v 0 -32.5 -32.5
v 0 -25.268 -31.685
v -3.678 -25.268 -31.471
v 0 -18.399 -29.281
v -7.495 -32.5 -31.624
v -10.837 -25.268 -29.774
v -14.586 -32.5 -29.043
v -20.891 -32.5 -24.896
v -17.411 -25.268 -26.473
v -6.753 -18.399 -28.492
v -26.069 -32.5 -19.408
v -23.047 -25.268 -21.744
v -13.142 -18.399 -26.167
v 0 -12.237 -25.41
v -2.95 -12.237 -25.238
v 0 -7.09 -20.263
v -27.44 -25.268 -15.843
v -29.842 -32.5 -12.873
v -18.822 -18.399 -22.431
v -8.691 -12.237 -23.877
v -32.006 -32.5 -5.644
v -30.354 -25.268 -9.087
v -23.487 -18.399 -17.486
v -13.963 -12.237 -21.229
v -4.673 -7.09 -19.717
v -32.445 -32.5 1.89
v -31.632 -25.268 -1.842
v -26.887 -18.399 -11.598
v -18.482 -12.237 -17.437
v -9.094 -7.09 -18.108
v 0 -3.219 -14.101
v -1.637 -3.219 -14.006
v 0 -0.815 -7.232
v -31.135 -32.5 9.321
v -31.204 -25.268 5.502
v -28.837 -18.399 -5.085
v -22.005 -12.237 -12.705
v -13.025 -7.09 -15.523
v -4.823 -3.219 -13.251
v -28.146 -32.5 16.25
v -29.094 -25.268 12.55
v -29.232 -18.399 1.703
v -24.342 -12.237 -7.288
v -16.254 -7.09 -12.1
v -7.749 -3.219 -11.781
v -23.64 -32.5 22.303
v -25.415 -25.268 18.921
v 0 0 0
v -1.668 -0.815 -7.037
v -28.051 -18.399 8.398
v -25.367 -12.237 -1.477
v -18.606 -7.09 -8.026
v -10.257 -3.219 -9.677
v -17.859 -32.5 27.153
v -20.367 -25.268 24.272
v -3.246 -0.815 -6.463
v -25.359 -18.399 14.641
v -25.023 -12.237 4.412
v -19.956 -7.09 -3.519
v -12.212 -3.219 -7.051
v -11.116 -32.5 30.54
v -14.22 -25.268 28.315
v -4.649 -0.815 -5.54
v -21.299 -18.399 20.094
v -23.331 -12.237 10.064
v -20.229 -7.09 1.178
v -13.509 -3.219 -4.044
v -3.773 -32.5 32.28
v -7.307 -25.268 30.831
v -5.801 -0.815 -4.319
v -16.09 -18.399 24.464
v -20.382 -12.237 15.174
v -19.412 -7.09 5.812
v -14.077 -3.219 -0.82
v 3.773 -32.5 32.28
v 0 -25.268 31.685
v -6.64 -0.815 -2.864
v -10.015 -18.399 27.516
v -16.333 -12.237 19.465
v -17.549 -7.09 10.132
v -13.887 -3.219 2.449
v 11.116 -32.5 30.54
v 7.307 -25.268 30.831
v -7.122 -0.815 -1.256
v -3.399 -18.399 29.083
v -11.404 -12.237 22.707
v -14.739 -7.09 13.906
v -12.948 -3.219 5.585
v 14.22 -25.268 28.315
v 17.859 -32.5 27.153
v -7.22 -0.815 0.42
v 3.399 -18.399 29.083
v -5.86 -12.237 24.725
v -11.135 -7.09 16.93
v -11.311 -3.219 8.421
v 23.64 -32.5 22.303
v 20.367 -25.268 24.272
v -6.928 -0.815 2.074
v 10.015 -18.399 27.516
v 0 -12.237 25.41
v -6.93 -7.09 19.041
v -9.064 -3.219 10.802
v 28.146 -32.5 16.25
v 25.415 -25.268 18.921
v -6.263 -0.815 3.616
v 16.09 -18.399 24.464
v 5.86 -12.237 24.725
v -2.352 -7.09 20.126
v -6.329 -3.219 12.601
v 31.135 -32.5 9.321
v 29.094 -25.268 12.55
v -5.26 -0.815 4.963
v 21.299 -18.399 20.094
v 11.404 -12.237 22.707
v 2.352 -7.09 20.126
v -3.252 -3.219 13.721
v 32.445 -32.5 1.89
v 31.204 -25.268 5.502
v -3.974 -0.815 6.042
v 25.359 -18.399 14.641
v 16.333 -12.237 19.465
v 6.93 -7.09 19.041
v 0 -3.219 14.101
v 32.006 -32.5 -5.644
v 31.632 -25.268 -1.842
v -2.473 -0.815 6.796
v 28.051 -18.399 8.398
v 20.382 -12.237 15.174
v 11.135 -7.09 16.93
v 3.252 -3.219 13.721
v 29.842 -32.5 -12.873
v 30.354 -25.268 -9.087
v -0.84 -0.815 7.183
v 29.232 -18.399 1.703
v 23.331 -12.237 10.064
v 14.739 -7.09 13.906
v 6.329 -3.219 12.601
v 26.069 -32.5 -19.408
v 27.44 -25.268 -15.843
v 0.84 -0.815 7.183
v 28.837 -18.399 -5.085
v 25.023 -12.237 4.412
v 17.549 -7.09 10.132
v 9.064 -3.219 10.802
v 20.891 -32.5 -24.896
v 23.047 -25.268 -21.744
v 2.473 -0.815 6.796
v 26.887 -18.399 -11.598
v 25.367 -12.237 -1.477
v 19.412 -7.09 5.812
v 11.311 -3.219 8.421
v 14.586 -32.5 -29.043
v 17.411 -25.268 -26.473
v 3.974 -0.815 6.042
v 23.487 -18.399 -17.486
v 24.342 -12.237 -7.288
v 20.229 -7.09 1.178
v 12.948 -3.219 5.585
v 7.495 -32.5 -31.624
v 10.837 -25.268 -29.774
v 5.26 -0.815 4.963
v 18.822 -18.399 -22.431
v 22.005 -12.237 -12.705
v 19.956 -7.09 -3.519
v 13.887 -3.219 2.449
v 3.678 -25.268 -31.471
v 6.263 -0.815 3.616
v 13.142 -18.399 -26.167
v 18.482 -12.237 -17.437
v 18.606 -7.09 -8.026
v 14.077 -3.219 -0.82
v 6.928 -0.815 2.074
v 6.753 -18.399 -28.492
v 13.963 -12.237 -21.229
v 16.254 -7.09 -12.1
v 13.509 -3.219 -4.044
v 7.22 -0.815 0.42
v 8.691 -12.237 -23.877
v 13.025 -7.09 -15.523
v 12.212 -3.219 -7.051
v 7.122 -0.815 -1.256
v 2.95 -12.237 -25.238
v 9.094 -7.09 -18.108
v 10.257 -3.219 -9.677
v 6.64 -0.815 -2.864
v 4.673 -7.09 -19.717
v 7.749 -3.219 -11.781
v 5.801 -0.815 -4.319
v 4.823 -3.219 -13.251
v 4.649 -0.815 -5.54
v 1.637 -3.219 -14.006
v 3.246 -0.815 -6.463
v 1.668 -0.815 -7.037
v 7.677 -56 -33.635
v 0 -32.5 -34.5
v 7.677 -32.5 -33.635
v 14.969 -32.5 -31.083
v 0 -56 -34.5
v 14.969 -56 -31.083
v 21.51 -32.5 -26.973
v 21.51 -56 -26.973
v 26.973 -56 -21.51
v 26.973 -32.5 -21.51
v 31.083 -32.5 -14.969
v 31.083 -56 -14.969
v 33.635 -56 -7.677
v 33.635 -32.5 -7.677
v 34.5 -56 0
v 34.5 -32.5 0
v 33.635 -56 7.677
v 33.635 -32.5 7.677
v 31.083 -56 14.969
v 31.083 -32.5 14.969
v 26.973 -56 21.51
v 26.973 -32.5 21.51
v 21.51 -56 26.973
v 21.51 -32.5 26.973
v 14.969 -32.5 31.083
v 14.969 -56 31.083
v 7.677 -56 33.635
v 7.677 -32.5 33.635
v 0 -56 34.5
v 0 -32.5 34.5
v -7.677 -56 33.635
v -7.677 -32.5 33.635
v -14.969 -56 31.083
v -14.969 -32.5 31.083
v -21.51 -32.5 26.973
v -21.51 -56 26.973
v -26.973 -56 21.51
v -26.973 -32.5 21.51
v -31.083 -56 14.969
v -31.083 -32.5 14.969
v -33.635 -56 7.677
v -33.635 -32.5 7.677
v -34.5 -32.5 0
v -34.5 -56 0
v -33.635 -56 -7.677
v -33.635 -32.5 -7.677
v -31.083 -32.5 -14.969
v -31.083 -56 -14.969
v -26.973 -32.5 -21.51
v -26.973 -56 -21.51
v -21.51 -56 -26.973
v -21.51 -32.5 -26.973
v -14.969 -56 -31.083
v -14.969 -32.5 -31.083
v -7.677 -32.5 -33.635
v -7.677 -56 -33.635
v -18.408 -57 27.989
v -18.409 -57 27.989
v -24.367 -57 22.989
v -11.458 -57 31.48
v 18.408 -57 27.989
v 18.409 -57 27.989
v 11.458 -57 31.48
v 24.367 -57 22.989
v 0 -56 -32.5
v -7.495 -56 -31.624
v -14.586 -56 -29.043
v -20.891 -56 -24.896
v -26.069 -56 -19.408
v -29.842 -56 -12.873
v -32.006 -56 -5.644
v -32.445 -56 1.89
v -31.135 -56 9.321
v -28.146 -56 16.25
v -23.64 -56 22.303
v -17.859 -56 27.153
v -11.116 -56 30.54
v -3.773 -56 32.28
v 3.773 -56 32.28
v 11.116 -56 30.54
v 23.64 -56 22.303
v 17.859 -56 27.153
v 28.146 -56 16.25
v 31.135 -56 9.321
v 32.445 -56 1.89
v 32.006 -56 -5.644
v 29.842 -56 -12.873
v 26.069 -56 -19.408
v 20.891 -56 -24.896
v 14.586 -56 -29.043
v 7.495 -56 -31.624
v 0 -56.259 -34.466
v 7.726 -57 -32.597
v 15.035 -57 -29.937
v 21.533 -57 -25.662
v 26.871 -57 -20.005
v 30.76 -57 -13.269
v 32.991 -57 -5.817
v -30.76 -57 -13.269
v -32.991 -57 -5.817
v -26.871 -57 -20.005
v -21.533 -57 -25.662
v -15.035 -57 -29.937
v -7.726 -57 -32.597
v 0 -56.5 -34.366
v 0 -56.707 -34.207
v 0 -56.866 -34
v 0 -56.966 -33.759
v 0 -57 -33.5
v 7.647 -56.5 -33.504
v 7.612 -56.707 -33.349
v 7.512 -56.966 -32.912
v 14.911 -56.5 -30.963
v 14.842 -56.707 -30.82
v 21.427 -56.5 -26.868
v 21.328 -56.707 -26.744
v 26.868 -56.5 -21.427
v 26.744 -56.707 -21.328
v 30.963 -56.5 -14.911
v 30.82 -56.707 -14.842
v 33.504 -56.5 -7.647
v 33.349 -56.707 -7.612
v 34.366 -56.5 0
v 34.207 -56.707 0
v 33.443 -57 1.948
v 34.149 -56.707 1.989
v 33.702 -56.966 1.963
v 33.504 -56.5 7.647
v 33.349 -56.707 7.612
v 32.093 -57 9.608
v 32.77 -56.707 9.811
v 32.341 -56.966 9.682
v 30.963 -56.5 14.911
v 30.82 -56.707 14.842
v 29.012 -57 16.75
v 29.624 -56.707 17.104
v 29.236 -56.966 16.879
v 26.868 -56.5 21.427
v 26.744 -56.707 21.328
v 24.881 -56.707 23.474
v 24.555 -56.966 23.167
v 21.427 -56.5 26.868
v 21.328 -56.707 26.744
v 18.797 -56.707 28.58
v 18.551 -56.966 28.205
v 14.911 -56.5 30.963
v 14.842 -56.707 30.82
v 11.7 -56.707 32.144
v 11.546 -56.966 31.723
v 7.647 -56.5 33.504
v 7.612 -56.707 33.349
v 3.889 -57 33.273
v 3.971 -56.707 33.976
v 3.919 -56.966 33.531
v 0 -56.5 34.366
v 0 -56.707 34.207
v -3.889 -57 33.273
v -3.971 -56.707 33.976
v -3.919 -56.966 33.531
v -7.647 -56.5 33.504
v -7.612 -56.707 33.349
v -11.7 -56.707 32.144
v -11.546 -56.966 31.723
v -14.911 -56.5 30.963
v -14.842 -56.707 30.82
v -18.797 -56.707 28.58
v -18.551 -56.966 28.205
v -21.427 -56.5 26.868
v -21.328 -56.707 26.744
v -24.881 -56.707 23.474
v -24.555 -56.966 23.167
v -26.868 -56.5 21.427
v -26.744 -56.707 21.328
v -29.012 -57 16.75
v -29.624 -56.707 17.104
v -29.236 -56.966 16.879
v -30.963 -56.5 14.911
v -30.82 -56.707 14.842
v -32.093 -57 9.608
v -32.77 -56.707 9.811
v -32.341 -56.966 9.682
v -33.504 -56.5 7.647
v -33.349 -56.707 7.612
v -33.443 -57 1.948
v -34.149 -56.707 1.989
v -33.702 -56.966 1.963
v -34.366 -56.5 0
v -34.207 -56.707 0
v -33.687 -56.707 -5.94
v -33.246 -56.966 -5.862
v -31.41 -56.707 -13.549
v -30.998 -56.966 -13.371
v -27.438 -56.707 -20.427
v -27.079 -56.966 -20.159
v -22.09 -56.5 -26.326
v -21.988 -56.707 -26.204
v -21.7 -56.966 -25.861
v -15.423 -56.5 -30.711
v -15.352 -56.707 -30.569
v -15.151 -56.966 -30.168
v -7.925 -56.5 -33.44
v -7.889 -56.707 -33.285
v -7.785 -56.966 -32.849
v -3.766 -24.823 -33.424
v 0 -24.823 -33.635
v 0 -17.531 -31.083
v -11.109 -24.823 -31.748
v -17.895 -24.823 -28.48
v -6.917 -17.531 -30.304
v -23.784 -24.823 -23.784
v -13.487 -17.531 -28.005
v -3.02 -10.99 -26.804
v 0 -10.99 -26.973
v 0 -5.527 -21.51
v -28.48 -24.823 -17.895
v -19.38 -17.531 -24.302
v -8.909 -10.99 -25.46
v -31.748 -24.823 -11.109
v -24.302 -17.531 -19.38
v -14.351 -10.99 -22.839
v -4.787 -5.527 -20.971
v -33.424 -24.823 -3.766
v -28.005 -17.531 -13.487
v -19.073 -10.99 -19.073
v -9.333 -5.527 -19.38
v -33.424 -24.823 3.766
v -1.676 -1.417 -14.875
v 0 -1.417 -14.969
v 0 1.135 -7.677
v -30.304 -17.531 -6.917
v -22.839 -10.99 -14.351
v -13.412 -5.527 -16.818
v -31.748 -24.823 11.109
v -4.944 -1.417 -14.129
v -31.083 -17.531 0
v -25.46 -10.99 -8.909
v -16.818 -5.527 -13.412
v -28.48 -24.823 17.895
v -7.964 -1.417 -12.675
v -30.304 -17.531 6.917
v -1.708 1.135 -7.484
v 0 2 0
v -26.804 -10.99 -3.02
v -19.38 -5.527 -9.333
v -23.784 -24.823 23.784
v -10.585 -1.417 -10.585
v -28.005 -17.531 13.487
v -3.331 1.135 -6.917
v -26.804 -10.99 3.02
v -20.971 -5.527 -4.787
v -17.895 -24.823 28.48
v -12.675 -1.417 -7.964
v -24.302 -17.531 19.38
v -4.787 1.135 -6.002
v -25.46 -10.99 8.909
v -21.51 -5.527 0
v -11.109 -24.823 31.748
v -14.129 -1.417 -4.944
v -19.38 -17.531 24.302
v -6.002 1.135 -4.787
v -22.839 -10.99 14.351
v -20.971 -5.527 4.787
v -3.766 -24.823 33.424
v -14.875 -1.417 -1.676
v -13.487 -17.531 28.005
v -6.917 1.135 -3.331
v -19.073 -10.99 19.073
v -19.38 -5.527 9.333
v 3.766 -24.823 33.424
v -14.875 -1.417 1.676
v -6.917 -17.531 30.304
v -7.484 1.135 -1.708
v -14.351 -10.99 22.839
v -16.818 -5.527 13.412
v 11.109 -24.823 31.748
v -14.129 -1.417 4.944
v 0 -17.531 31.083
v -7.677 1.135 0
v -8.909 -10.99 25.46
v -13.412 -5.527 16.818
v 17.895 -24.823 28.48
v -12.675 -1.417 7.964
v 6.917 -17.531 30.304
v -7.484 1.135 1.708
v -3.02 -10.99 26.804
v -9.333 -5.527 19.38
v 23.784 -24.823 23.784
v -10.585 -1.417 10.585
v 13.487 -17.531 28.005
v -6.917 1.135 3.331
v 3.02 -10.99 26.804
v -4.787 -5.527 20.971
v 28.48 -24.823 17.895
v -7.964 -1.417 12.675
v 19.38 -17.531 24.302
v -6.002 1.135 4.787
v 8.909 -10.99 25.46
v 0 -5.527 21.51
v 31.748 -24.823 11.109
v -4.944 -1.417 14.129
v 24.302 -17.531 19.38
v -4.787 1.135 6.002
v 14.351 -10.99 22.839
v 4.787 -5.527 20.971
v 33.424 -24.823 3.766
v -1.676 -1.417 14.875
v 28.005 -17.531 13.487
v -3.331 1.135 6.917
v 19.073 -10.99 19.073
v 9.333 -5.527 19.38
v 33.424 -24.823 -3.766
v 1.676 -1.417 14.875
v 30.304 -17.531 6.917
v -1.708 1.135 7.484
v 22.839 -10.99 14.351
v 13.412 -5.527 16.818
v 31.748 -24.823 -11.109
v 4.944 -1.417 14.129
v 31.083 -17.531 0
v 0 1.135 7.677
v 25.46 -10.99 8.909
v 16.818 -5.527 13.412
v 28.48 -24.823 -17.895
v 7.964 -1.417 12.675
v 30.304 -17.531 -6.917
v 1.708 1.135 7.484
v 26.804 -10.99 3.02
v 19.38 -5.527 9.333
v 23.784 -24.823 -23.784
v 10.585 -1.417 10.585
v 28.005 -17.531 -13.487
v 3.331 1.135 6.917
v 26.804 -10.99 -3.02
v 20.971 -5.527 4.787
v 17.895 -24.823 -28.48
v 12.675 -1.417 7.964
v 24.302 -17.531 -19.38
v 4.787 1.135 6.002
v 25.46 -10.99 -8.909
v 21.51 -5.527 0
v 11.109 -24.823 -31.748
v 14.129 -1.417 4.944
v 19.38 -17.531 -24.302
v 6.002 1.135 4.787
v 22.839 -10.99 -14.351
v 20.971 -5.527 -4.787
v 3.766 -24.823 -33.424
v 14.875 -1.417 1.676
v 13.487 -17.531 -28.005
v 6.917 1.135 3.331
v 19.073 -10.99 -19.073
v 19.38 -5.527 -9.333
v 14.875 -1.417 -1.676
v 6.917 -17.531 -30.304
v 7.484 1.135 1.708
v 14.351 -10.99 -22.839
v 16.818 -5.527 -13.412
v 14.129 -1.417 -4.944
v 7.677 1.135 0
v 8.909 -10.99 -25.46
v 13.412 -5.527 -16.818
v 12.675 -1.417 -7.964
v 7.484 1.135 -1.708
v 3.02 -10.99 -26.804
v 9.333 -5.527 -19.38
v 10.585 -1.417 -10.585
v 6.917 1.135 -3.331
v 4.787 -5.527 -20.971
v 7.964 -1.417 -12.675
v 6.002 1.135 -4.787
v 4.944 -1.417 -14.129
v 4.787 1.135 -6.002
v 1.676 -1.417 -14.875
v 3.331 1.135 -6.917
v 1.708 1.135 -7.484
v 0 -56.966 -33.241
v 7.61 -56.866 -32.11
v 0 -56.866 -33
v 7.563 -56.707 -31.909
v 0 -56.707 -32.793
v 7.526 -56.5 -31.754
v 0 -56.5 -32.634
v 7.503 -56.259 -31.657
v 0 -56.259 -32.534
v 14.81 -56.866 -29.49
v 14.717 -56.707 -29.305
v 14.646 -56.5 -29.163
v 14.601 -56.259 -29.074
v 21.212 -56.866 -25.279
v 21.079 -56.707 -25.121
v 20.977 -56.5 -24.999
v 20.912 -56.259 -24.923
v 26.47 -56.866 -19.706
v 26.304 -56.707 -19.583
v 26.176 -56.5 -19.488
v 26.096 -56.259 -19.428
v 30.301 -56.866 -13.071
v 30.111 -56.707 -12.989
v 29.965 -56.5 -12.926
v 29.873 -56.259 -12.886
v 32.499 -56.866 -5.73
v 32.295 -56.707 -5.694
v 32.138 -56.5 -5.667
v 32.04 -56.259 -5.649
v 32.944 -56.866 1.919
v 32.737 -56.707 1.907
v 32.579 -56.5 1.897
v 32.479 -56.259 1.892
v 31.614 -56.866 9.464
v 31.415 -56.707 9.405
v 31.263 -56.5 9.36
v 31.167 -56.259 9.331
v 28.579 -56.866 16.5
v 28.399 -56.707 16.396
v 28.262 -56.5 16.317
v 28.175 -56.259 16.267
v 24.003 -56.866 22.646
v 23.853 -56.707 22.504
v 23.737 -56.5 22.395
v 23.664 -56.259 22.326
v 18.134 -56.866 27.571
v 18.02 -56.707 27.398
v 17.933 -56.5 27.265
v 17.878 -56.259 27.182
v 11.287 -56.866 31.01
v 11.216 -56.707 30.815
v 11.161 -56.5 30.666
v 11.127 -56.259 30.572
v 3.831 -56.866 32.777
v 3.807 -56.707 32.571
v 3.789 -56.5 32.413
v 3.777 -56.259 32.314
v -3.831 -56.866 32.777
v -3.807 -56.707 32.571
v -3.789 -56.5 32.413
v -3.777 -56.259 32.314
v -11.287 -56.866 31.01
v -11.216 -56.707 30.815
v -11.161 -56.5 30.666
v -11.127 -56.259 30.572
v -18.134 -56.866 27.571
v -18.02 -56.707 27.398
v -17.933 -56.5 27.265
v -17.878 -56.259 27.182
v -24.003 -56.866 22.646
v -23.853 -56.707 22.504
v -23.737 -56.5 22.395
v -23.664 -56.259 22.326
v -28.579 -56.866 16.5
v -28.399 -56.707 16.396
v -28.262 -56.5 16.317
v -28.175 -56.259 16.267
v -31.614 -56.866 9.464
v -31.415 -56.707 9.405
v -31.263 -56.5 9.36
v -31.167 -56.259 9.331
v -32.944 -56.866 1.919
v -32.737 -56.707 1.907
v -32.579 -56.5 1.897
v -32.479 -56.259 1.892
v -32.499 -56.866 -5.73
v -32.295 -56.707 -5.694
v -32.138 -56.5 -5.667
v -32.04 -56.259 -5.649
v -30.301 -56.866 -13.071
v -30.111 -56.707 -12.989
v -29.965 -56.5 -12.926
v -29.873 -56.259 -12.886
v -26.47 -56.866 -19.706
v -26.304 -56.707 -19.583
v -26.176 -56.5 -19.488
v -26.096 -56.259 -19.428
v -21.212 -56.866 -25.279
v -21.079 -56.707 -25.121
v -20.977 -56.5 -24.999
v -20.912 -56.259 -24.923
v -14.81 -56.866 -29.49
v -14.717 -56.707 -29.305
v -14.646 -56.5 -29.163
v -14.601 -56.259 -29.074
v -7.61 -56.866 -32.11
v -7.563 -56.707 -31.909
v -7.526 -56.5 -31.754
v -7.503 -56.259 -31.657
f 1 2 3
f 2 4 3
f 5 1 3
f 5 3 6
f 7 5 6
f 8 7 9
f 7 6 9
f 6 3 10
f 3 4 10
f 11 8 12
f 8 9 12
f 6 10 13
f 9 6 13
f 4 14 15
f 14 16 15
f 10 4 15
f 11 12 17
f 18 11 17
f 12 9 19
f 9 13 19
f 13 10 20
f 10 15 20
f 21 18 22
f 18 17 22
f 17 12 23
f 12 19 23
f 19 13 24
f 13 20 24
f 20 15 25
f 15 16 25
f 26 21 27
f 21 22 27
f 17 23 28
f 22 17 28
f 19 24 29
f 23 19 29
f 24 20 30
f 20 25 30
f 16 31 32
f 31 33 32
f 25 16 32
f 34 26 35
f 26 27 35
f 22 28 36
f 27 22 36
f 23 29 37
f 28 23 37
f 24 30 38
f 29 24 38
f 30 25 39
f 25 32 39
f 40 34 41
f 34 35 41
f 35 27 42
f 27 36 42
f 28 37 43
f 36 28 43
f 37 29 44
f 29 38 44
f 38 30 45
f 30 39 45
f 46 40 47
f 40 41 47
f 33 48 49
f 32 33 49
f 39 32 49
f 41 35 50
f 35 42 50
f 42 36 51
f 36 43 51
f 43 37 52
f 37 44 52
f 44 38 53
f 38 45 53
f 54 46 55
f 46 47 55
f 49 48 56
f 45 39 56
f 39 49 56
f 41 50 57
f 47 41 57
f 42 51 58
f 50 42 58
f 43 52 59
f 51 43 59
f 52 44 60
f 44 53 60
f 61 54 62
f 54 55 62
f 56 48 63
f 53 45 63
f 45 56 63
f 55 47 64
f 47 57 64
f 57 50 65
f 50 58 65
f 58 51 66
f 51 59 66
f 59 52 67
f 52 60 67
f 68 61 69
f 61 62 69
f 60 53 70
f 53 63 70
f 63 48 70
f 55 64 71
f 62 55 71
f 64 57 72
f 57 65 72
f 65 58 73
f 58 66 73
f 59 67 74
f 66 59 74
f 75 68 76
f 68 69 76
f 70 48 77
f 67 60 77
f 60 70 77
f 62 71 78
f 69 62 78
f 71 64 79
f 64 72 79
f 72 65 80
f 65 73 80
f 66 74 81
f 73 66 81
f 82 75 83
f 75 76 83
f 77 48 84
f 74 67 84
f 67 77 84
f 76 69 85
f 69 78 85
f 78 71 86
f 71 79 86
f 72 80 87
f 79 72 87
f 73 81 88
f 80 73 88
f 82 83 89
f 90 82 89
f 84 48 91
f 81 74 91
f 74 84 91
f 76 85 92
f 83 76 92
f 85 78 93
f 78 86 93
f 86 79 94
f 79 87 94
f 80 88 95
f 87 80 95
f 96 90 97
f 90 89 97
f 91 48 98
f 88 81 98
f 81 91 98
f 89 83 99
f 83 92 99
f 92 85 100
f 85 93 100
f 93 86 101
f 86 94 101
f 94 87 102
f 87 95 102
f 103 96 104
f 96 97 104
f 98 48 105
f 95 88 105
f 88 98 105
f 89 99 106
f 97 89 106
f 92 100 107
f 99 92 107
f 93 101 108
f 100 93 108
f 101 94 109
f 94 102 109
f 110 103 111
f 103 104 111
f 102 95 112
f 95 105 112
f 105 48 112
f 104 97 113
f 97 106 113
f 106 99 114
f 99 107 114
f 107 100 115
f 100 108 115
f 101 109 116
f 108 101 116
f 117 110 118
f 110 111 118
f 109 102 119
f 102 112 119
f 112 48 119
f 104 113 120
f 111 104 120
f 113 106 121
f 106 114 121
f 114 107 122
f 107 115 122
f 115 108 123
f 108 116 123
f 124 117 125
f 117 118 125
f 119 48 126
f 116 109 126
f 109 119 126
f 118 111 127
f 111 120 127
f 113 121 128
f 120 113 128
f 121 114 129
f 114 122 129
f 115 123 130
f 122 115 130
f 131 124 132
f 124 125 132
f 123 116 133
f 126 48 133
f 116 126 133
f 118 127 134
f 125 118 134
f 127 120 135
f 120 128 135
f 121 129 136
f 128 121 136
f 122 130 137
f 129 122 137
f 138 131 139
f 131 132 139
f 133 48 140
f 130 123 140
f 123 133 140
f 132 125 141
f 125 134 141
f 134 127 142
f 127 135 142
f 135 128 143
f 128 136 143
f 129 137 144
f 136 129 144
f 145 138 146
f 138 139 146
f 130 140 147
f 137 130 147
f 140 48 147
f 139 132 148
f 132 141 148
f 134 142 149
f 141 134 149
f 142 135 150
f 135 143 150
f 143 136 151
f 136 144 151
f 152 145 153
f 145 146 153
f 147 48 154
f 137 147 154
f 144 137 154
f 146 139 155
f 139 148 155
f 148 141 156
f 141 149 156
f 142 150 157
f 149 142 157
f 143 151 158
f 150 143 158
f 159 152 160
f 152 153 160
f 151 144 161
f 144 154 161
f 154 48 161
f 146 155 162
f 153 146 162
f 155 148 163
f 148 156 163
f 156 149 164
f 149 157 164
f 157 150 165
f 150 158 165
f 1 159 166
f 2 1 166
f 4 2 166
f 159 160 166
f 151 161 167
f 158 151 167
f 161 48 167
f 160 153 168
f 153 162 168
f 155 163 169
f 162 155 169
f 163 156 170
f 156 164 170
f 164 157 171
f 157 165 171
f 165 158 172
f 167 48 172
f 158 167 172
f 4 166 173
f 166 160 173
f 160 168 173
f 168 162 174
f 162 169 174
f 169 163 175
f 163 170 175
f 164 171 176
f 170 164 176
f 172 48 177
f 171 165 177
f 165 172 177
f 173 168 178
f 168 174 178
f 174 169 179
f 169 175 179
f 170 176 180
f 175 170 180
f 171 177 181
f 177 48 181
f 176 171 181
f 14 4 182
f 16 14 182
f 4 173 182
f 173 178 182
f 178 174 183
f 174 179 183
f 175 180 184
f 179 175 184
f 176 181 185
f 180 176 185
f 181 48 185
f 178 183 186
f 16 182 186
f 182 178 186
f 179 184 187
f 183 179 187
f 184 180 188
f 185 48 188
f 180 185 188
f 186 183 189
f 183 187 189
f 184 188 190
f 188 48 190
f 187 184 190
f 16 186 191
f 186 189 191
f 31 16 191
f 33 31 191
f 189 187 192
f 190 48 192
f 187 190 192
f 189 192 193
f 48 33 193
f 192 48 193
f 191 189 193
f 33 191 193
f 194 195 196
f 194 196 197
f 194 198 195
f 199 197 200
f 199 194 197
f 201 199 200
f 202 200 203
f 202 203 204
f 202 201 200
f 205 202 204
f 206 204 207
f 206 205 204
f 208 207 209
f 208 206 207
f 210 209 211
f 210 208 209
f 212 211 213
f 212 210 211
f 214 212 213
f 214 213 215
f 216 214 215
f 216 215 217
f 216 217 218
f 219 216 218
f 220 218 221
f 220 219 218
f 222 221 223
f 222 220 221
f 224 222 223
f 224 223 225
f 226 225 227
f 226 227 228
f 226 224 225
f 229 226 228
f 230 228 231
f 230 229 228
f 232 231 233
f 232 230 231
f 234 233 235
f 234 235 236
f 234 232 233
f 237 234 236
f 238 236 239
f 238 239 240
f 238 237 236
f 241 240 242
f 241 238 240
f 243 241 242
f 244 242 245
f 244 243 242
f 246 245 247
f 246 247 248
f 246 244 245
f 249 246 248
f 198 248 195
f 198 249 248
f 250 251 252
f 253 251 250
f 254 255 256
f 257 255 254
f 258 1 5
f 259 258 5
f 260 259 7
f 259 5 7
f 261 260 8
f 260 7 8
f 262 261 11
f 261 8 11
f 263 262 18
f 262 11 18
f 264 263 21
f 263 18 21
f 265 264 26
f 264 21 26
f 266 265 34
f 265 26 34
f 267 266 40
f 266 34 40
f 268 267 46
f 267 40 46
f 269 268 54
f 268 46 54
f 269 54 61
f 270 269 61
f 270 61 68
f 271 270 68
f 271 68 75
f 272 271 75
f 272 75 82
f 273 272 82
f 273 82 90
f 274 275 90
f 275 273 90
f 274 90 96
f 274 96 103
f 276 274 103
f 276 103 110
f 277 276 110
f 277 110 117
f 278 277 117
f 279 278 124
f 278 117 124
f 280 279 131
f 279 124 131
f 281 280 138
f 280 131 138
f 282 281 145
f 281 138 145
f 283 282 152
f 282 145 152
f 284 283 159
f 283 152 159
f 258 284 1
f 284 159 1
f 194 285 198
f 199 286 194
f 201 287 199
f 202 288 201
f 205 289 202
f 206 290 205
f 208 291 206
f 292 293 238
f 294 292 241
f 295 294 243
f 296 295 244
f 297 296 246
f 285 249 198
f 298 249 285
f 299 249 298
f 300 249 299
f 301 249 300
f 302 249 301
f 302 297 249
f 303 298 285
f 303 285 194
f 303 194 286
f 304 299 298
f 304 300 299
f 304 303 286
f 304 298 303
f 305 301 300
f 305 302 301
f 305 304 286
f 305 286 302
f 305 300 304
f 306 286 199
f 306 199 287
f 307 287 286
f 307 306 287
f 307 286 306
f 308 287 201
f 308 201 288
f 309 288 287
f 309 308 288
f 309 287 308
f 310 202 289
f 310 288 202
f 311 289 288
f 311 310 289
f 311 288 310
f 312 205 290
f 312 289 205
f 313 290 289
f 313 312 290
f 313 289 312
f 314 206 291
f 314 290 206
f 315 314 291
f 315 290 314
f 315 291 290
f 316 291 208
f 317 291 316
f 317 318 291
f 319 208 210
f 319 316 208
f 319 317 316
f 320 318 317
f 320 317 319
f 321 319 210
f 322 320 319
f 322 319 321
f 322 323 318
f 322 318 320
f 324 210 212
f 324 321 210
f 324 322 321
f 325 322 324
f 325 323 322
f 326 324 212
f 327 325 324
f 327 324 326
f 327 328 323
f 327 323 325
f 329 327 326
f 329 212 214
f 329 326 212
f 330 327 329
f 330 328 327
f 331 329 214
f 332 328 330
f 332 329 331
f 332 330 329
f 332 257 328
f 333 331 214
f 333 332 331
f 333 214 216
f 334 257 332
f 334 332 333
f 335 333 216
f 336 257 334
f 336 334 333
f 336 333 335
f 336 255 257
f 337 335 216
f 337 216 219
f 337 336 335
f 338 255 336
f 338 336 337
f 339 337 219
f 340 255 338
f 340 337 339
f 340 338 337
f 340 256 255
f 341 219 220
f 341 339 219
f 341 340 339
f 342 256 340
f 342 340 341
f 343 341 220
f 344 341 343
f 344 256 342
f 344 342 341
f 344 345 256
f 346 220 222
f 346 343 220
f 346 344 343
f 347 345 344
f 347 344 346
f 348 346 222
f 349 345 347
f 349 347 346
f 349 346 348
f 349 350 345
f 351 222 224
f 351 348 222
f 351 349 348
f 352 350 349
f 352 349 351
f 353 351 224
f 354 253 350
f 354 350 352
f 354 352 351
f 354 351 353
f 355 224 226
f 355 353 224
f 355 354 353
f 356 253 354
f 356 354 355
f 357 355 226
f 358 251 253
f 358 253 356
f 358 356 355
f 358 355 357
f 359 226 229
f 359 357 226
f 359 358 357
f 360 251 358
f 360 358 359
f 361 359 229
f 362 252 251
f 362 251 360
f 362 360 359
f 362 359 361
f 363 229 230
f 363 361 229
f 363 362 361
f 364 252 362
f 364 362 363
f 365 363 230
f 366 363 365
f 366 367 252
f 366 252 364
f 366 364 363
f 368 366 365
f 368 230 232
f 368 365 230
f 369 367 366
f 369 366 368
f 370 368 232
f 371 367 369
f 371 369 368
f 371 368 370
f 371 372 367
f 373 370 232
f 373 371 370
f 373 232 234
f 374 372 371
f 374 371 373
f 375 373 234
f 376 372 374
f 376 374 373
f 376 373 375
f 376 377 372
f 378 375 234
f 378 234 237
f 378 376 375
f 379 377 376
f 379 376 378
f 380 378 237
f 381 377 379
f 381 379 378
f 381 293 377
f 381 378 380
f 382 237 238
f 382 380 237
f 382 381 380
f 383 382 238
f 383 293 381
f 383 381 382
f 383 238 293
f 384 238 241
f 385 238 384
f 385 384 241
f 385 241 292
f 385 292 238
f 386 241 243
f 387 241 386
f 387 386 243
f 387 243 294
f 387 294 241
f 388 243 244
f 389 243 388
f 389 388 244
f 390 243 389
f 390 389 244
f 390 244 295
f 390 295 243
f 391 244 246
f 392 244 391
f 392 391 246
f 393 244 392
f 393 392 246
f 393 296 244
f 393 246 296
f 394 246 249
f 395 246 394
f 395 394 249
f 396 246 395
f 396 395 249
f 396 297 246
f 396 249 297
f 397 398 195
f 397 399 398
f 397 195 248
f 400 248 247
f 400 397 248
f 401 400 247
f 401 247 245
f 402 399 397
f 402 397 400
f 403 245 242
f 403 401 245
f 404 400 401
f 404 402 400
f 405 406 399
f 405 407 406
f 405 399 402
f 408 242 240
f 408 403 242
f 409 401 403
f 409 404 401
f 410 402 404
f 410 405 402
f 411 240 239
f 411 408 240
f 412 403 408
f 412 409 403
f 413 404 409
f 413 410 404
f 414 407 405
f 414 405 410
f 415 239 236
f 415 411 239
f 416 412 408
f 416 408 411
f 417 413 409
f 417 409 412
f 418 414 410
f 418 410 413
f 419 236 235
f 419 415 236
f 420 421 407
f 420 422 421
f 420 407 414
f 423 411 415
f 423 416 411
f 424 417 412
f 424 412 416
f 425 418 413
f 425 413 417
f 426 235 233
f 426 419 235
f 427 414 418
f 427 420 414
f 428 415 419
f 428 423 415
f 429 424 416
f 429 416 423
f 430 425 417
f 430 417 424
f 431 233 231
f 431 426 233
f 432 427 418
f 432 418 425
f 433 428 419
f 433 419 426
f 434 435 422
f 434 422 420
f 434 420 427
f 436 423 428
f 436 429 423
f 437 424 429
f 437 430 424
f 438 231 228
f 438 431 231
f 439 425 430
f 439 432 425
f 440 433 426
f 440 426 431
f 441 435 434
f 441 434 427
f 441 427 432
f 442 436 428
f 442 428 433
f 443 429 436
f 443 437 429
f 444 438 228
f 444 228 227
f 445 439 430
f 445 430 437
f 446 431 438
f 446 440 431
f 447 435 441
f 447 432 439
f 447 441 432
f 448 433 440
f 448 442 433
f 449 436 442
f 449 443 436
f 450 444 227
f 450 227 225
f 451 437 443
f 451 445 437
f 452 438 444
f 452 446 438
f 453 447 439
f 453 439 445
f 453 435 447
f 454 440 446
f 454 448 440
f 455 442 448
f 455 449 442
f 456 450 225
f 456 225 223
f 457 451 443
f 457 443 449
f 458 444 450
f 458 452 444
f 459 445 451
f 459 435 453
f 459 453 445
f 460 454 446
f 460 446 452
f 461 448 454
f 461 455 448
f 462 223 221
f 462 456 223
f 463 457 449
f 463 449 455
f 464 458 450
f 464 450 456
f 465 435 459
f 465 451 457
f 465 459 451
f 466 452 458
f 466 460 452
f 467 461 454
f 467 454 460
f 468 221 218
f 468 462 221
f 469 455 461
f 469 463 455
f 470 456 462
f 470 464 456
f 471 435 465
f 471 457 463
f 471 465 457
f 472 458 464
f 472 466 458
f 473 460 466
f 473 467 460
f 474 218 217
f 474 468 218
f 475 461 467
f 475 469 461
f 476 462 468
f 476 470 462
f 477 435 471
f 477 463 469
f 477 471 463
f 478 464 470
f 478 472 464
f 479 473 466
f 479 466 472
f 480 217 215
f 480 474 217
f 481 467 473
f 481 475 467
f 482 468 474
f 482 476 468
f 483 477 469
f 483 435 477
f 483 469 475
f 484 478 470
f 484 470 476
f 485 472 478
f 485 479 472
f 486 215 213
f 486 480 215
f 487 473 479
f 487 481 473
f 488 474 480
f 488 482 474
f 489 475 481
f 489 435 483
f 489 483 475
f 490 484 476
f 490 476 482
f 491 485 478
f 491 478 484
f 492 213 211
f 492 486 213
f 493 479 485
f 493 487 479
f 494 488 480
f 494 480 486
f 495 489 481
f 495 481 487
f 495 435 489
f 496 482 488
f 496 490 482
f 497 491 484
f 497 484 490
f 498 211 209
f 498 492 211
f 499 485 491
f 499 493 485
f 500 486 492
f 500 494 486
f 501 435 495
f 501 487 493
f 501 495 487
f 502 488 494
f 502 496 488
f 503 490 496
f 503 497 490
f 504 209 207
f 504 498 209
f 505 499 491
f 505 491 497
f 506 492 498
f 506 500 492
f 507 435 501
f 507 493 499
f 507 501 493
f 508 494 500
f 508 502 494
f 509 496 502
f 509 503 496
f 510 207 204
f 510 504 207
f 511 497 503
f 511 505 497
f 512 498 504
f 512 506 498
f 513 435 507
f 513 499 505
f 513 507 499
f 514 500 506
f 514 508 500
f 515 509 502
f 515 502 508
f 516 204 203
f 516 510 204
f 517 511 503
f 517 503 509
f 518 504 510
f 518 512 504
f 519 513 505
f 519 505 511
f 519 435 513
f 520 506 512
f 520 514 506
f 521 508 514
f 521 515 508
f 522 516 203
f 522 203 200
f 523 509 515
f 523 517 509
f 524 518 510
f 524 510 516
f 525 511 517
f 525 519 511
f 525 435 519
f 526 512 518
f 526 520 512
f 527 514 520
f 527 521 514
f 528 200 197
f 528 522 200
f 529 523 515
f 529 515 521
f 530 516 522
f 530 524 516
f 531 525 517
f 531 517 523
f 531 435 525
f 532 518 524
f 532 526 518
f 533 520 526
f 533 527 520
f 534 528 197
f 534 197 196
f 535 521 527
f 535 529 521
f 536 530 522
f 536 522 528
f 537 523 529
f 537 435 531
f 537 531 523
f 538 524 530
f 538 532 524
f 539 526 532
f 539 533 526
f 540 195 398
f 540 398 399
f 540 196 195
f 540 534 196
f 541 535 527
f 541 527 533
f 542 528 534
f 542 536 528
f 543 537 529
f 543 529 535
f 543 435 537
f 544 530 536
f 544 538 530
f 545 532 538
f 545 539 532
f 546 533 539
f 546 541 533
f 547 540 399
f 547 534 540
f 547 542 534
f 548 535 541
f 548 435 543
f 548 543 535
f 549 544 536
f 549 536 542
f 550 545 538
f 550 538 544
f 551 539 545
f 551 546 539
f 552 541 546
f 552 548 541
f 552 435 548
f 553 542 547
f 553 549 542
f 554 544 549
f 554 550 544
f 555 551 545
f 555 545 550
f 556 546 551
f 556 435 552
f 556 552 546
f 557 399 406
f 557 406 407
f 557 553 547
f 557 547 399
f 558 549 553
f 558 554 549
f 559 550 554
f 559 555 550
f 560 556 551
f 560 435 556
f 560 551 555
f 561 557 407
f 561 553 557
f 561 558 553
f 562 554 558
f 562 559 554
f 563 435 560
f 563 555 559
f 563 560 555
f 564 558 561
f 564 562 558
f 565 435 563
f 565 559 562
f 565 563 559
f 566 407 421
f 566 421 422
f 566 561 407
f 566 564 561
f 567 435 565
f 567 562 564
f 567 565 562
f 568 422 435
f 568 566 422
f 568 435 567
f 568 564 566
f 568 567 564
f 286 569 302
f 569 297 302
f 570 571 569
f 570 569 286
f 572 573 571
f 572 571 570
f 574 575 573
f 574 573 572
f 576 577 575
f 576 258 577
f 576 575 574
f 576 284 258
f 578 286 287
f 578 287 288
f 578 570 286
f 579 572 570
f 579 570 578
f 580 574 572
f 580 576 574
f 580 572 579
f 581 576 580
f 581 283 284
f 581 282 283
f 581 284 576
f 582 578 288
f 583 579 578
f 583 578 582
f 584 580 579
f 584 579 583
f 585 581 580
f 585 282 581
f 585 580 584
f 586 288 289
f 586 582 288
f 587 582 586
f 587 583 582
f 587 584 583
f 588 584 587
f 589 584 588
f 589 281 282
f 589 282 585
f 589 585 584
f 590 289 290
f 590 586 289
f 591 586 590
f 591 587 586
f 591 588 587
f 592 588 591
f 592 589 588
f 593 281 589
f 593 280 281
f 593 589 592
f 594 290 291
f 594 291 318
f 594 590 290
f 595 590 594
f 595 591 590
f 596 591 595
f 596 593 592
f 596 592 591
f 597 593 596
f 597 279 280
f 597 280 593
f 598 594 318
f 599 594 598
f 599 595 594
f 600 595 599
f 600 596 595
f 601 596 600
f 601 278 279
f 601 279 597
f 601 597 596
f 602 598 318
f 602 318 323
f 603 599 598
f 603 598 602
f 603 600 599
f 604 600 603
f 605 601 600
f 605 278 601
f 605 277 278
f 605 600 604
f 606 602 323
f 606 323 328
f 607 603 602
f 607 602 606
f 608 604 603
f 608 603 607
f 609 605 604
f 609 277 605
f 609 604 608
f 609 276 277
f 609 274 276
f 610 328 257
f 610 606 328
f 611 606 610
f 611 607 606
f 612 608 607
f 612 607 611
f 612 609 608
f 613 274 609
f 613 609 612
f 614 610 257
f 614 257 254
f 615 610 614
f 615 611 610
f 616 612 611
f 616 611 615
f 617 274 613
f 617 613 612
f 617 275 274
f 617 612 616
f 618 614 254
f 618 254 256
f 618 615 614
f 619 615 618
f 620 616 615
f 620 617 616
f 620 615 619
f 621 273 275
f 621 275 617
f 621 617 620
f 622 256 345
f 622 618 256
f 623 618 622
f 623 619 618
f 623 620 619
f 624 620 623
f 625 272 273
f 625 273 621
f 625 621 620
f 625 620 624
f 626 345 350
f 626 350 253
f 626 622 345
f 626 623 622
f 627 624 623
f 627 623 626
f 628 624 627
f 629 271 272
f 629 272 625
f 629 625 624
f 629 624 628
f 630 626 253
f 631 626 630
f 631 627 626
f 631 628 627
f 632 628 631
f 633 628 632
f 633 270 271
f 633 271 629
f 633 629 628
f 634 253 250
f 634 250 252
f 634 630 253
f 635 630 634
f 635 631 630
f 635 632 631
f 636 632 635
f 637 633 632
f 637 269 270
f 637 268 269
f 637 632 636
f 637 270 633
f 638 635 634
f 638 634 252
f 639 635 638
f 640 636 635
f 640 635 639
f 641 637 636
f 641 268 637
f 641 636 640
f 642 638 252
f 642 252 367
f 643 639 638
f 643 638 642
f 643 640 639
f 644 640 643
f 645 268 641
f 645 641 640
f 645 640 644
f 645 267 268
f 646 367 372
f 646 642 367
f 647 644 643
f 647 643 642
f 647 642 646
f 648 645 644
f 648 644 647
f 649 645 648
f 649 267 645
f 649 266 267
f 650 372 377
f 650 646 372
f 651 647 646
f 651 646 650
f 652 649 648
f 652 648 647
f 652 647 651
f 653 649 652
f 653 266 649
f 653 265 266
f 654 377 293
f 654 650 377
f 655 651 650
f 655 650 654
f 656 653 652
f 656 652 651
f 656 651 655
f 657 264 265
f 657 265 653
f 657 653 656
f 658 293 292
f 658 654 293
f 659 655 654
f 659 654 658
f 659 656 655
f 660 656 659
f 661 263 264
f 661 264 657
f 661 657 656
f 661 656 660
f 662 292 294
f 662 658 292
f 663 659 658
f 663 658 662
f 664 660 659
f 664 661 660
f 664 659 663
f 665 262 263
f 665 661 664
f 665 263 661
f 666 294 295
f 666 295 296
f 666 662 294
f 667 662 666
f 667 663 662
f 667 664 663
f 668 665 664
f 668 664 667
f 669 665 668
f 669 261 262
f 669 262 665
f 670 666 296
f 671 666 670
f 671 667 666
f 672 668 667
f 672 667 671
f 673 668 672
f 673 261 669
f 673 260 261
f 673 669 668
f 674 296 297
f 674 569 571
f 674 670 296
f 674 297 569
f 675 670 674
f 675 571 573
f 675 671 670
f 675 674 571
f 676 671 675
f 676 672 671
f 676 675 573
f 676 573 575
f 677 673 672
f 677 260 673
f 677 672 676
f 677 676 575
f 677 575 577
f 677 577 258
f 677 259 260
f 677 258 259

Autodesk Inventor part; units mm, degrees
ref_plane "YZ Plane" through (0, 0, 0) normal (1, 0, 0) x (0, 1, 0)
ref_plane "XZ Plane" through (0, 0, 0) normal (0, 1, 0) x (-1, 0, 0)
ref_plane "XY Plane" through (0, 0, 0) normal (0, 0, 1) x (1, 0, 0)
sketch "Sketch1" plane through (0, 0, 0) normal (1, 0, 0) x (0, 1, 0)
  line L0 (0, 0) -> (-57, 0)
  line L1 (0, 0) -> (2, 0)
  line L2 (-57, 0) -> (-57, -32.5)
  line L3 (-57, -32.5) -> (-57, -34.5)
  line L4 (0, 0) -> (-32.5, 0)
  circle A0 centre (-32.5, 0) radius 32.5
  circle A1 centre (-32.5, 0) radius 34.5
  line L5 (-57, -32.5) -> (-32.5, -32.5)
  line L6 (-32.5, -34.5) -> (-57, -34.5)
  line L7 (0, 0) -> (2, 0)
  dimension "d0" = 57
  dimension "d1" = 2
  dimension "d2" = 32.5
  dimension "d3" = 2
  dimension "d4" = 32.5
revolve "Revolution1" add sketch "Sketch1" angle 360 about axis through (0, 0, 0) along (0, -1, 0) contours L1 A1 L5 A0 | L6 L3 L5 A1
fillet "Fillet1" radius 1 1 edges at (0, -57, 34.5)
fillet "Fillet2" radius 1 1 edges at (0, -57, 32.5)
properties part number "BlueYetiCap"
